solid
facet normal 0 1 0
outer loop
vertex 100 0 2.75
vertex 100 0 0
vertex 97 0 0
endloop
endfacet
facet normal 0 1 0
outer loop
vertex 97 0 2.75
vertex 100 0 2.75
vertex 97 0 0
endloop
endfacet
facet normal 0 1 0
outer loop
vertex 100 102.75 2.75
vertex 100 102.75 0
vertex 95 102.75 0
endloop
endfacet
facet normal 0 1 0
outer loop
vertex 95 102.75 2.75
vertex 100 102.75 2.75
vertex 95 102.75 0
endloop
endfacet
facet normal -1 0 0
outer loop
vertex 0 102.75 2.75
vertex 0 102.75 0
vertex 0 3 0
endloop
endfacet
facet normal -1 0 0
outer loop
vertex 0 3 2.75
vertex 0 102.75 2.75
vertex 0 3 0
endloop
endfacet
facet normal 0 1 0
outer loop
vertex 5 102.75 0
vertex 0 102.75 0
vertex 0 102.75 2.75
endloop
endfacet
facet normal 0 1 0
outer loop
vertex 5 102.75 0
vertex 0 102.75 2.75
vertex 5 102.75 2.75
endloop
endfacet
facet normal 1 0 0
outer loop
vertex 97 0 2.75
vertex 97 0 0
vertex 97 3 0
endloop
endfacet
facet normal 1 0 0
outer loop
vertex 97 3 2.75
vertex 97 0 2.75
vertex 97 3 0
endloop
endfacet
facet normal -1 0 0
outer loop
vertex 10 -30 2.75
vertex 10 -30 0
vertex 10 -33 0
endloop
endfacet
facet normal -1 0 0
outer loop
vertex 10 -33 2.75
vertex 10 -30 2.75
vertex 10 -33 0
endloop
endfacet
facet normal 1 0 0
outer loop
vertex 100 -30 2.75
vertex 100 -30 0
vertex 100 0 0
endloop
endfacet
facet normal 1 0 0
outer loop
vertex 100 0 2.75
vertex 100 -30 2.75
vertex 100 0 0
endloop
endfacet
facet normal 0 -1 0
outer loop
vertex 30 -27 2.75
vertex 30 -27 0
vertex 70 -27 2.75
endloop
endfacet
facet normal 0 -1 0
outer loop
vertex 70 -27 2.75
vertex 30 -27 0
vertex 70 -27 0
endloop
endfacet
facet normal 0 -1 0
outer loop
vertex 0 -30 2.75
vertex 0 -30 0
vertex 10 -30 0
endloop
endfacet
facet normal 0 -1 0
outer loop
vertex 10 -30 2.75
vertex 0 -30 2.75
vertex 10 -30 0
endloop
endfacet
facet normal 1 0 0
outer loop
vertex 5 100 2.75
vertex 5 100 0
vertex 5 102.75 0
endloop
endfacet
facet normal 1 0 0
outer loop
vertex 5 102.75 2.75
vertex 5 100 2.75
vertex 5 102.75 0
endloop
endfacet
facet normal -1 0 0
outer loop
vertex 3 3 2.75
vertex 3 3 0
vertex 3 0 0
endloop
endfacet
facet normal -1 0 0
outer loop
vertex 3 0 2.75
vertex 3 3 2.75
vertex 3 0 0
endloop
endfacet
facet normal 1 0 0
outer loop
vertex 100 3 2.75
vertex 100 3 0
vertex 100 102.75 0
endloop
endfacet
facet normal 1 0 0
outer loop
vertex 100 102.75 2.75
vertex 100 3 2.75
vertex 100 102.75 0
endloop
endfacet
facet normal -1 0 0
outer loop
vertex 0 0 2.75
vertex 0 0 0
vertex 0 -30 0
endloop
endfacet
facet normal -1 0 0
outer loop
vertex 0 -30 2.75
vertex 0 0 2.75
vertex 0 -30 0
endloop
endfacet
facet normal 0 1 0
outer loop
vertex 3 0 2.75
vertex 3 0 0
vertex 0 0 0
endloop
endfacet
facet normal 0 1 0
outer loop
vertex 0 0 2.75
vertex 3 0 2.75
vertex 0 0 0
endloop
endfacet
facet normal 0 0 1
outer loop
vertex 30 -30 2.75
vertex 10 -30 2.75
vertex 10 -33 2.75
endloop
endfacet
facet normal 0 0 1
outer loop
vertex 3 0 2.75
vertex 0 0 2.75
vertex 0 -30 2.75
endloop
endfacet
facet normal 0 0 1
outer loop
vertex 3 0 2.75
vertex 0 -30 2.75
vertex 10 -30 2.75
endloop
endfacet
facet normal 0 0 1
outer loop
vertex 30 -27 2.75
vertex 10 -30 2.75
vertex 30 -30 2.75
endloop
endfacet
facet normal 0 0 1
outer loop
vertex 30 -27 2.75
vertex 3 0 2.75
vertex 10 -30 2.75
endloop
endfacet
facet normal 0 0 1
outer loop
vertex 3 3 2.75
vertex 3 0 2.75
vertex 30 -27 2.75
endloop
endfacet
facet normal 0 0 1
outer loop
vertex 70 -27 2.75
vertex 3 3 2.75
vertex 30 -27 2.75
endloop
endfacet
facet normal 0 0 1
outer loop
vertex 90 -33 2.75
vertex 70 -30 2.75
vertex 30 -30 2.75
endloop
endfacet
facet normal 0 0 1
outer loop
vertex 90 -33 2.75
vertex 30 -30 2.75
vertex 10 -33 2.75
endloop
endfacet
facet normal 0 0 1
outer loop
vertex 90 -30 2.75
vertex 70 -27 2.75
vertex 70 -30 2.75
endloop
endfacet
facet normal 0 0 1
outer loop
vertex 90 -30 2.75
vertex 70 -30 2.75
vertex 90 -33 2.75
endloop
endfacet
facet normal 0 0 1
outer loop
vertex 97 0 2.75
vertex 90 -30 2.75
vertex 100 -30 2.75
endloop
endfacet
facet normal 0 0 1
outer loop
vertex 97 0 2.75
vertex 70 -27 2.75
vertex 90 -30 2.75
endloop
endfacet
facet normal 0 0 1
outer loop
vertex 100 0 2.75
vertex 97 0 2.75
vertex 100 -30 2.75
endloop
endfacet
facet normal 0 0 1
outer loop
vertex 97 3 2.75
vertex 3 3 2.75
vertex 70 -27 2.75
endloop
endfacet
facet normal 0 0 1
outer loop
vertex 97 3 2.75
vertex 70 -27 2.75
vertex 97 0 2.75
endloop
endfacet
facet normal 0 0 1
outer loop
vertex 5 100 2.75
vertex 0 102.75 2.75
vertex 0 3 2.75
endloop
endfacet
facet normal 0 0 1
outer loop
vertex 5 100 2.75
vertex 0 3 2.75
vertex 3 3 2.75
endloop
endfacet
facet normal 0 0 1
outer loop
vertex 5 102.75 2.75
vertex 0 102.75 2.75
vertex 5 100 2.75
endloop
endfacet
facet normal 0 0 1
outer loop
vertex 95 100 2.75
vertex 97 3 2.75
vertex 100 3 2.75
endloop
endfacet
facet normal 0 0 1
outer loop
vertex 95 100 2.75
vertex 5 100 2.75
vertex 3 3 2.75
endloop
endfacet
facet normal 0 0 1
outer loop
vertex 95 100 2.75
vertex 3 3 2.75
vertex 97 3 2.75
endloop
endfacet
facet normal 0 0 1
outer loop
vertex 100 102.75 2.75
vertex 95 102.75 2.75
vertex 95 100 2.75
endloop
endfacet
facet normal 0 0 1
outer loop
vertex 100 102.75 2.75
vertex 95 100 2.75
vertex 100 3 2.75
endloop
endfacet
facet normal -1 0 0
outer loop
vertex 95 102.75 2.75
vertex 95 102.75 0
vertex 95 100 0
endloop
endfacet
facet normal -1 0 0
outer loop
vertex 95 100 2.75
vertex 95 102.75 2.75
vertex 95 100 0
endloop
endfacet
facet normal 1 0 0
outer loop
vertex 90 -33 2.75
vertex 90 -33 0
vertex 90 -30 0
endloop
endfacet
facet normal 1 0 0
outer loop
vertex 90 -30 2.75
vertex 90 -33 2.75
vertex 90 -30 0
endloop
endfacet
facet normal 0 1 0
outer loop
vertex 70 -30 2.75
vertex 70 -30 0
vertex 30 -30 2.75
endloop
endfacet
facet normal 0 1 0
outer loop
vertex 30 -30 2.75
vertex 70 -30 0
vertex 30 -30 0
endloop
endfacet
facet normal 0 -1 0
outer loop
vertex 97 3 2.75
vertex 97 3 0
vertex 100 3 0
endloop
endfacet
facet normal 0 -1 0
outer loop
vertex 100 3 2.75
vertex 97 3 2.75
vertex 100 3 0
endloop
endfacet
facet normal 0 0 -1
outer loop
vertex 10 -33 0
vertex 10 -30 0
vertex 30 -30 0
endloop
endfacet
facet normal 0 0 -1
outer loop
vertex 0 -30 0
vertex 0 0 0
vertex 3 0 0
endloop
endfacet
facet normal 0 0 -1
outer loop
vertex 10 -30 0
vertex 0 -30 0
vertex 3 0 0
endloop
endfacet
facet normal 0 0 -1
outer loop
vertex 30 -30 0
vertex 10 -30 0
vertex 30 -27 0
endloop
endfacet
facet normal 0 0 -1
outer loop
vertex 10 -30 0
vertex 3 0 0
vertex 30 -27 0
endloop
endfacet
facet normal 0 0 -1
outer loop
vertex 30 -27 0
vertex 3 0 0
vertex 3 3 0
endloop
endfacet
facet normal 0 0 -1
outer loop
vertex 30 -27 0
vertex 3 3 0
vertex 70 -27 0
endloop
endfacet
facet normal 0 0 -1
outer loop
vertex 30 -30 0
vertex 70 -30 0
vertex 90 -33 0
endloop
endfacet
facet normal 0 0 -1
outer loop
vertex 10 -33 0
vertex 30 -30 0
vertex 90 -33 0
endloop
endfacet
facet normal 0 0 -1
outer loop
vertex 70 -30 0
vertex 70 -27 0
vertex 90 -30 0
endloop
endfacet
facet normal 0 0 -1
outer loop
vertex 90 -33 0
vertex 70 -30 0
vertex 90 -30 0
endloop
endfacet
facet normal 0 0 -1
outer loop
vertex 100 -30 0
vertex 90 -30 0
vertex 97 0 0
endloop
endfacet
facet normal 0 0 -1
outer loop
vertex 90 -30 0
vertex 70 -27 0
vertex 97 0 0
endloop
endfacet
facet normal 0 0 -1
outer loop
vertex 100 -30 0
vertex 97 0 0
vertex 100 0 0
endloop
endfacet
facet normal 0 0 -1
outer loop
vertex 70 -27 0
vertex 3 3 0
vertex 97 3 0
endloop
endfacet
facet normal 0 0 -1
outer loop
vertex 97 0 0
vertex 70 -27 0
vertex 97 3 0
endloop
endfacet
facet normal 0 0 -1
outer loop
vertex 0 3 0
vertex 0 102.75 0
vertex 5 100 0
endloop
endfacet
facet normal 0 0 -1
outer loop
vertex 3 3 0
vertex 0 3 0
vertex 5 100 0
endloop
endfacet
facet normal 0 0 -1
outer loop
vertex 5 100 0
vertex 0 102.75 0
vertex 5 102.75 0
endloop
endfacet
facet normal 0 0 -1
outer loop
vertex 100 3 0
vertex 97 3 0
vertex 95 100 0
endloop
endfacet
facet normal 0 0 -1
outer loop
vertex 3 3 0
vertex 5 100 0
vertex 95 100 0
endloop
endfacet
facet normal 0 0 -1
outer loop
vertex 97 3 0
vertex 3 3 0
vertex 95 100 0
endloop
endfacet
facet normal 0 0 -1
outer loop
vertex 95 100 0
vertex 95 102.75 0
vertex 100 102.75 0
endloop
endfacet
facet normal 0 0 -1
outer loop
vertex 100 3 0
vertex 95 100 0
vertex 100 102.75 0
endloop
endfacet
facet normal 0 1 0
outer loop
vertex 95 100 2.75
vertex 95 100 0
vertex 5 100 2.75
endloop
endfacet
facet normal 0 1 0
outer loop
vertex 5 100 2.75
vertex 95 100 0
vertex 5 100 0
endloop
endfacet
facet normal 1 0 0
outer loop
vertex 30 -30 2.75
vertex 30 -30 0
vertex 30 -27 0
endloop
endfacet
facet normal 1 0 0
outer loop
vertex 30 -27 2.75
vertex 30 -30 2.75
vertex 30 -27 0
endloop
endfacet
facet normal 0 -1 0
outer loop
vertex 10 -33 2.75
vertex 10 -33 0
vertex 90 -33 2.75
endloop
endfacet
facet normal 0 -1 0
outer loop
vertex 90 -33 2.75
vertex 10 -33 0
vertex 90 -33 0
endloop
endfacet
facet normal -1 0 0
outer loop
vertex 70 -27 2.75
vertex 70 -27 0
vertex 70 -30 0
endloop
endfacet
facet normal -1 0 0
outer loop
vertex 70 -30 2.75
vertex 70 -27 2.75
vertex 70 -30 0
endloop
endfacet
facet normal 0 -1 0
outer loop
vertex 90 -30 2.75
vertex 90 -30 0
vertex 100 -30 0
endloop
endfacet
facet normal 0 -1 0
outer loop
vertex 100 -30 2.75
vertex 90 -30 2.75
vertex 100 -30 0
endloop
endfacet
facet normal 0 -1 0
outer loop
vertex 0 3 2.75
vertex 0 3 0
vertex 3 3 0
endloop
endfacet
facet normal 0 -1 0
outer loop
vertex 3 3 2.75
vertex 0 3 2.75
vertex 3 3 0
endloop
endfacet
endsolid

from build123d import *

# Parameters (mm, degrees)
SKETCH_1_W      = 5
SKETCH_1_H      = 2.75
EXTRUDE_1_DEPTH = 2.75


with BuildPart() as part:
    # 草图1 → 凸台-拉伸1 (new body)
    with BuildSketch(Plane.XY):
        Polygon((95, 100), (100, 100), (100, 102.75), (95, 102.75), (95, 102.449578136), align=None)
        Polygon((3, 3), (3, 0), (97, 0), (97, 3), (100, 3), (100, 100), (95, 100), (5, 100), (0, 100), (0, 3), align=None)
        with Locations((2.5, 101.375)):
            Rectangle(SKETCH_1_W, SKETCH_1_H)
        Polygon((0, 0), (0, -30), (10, -30), (30, -30), (30, -27), (50, -27), (70, -27), (70, -30), (90, -30), (100, -30), (100, 0), (97, 0), (3, 0), align=None)
        Polygon((30, -30), (10, -30), (10, -33), (90, -33), (90, -30), (70, -30), (50, -30), align=None)
    extrude(amount=EXTRUDE_1_DEPTH)


solid = part.part
